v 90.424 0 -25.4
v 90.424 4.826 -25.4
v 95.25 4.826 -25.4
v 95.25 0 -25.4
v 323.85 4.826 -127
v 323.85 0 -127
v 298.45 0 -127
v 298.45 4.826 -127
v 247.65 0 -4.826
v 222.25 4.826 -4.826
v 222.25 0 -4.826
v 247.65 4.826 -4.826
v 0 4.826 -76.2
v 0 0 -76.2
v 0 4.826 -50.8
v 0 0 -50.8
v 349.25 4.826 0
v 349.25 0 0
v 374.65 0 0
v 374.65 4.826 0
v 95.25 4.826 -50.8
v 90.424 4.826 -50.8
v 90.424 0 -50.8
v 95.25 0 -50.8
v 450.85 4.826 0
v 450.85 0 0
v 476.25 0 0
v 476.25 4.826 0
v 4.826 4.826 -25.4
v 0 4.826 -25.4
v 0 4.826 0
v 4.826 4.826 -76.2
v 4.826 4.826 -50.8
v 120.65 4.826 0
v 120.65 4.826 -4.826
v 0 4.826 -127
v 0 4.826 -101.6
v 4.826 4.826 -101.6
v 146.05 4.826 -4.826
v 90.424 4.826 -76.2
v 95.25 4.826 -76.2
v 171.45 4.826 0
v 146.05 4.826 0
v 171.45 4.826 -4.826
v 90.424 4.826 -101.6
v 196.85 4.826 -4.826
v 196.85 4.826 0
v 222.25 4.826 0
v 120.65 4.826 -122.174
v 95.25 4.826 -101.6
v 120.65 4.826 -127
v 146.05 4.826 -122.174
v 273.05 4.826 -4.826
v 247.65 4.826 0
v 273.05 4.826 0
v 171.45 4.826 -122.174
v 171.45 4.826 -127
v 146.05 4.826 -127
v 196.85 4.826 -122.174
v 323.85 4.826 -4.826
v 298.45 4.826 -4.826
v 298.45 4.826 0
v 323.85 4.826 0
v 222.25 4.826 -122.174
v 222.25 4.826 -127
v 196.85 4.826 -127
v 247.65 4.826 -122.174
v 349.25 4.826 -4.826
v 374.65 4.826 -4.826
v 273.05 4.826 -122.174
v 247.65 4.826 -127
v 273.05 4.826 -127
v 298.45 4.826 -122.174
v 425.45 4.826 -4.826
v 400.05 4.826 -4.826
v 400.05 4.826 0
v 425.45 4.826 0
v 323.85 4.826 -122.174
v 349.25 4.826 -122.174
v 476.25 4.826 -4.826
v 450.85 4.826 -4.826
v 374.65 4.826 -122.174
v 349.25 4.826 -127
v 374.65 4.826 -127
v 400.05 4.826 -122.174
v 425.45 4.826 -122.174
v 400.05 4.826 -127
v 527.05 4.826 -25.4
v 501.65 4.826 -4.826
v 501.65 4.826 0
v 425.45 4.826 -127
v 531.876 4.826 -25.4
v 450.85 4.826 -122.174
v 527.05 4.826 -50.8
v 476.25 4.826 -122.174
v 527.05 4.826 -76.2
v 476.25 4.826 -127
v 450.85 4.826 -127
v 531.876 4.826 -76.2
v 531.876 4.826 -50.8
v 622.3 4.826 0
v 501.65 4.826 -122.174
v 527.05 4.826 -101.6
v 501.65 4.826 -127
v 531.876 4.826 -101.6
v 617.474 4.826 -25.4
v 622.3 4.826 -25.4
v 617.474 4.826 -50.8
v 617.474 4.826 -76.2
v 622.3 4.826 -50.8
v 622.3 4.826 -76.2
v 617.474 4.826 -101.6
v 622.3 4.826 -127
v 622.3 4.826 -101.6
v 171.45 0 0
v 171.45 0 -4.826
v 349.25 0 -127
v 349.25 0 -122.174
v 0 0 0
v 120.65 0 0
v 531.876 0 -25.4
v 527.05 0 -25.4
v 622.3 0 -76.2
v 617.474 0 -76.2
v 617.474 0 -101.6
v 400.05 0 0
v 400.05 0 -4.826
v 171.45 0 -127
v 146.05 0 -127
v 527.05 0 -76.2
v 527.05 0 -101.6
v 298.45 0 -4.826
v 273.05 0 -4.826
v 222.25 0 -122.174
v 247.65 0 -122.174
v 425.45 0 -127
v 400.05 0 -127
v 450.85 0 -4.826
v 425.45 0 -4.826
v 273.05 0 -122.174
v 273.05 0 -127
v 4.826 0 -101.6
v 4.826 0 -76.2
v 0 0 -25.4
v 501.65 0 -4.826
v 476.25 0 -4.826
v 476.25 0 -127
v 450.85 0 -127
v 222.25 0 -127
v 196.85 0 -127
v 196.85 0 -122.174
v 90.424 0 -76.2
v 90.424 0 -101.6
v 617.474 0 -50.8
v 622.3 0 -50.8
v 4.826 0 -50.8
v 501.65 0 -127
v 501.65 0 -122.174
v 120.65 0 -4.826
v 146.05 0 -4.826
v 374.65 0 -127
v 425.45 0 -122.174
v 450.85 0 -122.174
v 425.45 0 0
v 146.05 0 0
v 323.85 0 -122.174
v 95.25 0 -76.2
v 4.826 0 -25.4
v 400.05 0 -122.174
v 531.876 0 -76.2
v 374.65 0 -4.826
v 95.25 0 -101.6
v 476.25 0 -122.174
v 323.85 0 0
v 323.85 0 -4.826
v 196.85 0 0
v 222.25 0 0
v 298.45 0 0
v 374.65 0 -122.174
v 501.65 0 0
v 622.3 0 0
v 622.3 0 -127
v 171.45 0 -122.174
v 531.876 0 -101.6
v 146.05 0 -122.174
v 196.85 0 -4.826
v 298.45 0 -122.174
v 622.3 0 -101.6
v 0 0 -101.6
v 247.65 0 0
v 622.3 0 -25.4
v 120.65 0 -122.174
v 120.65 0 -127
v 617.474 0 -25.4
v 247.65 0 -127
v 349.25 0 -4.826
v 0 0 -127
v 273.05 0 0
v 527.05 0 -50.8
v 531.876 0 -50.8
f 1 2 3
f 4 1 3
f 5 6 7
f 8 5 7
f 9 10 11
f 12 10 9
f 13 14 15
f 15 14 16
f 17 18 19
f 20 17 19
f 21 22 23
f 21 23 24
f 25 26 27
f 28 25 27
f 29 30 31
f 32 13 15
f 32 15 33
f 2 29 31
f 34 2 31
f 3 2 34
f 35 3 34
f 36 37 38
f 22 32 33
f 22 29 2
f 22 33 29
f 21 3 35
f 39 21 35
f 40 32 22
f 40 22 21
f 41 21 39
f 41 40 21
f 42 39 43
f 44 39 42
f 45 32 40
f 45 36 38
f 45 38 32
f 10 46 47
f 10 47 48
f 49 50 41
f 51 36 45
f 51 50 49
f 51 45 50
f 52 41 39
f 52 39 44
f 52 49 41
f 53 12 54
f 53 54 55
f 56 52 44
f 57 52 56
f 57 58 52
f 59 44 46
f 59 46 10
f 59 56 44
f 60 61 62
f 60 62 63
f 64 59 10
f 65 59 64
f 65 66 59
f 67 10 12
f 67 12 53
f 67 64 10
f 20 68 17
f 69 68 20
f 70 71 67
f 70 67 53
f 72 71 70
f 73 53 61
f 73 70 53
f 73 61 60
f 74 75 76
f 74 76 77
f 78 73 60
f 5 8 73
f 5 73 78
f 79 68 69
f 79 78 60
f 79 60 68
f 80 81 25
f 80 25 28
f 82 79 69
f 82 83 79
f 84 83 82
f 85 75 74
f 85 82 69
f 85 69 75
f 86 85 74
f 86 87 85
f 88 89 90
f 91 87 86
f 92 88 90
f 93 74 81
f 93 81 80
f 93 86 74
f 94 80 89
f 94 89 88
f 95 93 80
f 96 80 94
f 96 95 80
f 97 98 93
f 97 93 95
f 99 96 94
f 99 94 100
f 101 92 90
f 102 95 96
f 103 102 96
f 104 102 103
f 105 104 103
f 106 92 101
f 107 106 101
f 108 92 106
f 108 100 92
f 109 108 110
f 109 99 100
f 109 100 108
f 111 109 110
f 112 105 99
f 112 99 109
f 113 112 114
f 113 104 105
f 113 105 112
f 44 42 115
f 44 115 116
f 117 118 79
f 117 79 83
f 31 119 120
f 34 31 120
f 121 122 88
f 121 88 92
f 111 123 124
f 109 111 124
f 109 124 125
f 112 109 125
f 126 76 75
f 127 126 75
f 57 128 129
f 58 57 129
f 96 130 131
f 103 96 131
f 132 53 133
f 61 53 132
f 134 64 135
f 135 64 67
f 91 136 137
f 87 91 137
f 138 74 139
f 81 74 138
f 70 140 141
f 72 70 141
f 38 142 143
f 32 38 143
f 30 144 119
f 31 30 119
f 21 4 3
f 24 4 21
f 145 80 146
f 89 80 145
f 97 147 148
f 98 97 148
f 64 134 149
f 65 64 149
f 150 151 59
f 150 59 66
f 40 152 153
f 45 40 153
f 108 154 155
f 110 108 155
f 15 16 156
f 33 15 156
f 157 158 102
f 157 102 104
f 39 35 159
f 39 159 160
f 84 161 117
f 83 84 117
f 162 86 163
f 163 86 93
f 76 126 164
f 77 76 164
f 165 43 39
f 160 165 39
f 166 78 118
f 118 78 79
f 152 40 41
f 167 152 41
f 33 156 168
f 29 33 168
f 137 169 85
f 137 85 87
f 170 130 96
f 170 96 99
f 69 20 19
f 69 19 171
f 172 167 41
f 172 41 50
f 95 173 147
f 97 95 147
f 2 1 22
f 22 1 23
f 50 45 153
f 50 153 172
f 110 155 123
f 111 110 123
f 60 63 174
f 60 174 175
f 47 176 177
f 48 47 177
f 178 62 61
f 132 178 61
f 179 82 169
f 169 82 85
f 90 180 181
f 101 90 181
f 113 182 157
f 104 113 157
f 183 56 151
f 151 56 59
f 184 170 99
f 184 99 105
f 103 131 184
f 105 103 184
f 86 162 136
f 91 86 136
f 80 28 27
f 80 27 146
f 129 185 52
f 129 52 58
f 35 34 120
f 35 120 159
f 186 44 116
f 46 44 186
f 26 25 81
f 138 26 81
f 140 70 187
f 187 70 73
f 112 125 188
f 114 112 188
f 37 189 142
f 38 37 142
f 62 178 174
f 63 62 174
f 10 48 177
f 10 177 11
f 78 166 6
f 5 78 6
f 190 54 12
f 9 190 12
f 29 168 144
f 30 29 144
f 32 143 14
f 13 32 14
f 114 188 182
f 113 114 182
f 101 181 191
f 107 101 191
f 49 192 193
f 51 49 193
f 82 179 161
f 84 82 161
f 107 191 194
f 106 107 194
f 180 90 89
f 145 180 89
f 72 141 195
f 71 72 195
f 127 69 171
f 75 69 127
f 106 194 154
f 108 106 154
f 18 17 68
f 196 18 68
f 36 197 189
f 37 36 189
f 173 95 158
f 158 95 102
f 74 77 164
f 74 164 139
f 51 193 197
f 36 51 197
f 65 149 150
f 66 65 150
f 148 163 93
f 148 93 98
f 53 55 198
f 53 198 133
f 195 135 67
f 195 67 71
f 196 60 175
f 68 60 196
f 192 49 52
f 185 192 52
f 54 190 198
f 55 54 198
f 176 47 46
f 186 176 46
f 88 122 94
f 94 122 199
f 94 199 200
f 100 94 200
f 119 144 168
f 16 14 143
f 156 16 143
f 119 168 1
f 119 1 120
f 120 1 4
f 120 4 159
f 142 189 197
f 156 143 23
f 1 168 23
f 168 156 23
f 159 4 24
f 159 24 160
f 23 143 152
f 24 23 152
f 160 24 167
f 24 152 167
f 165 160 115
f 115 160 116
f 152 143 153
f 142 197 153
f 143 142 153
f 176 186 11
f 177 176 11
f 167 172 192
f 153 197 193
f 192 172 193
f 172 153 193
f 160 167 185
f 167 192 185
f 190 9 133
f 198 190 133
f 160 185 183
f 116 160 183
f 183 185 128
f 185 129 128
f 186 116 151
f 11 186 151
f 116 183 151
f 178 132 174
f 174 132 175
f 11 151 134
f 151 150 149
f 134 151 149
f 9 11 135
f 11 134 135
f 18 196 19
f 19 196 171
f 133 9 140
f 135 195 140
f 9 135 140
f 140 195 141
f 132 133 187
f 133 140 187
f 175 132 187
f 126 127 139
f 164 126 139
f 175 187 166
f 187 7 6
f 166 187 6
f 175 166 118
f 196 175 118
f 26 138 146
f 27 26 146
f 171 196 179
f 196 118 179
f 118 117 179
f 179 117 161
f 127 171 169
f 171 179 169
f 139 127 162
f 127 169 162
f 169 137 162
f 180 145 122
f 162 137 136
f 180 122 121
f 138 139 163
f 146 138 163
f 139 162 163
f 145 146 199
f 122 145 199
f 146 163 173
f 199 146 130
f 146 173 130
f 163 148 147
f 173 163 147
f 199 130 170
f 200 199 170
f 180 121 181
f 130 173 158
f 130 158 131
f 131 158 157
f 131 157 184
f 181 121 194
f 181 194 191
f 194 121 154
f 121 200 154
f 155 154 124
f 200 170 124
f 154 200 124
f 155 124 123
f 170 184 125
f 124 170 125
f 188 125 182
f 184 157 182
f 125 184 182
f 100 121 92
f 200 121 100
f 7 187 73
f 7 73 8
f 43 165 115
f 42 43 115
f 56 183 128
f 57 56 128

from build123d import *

# Parameters (mm, degrees)
SKETCH1_W           = 4.826
SKETCH1_H           = 25.4
BOSS_EXTRUDE1_DEPTH = 4.826
SKETCH2_W           = 25.4
SKETCH2_H           = 4.826
CUT_EXTRUDE1_DEPTH  = 5.826


with BuildPart() as part:
    # Sketch1 → Boss-Extrude1 (new body)
    with BuildSketch(Plane(origin=(0, 0, 0), x_dir=(1, 0, 0), z_dir=(0, 1, 0))):
        Polygon((0, 25.4), (0, 0), (622.3, 0), (622.3, 25.4), (617.474, 25.4), (617.474, 50.8), (622.3, 50.8), (622.3, 76.2), (617.474, 76.2), (617.474, 101.6), (622.3, 101.6), (622.3, 127), (0, 127), (0, 101.6), (4.826, 101.6), (4.826, 76.2), (0, 76.2), (0, 50.8), (4.826, 50.8), (4.826, 25.4), align=None)
        with Locations((92.837, 38.1)):
            Rectangle(SKETCH1_W, SKETCH1_H, mode=Mode.SUBTRACT)
        with Locations((529.463, 38.1)):
            Rectangle(SKETCH1_W, SKETCH1_H, mode=Mode.SUBTRACT)
        with Locations((92.837, 88.9)):
            Rectangle(SKETCH1_W, SKETCH1_H, mode=Mode.SUBTRACT)
        with Locations((529.463, 88.9)):
            Rectangle(SKETCH1_W, SKETCH1_H, mode=Mode.SUBTRACT)
    extrude(amount=BOSS_EXTRUDE1_DEPTH)

    # Sketch2 → Cut-Extrude1 (cut, through all)
    with BuildSketch(Plane(origin=(0, 4.826, 0), x_dir=(1, 0, 0), z_dir=(0, 1, 0))):
        with Locations((133.35, 124.587)):
            Rectangle(SKETCH2_W, SKETCH2_H)
        with Locations((184.15, 124.587)):
            Rectangle(SKETCH2_W, SKETCH2_H)
        with Locations((234.95, 124.587)):
            Rectangle(SKETCH2_W, SKETCH2_H)
        with Locations((285.75, 124.587)):
            Rectangle(SKETCH2_W, SKETCH2_H)
        with Locations((336.55, 124.587)):
            Rectangle(SKETCH2_W, SKETCH2_H)
        with Locations((387.35, 124.587)):
            Rectangle(SKETCH2_W, SKETCH2_H)
        with Locations((438.15, 124.587)):
            Rectangle(SKETCH2_W, SKETCH2_H)
        with Locations((488.95, 124.587)):
            Rectangle(SKETCH2_W, SKETCH2_H)
        with Locations((488.95, 2.413)):
            Rectangle(SKETCH2_W, SKETCH2_H)
        with Locations((438.15, 2.413)):
            Rectangle(SKETCH2_W, SKETCH2_H)
        with Locations((387.35, 2.413)):
            Rectangle(SKETCH2_W, SKETCH2_H)
        with Locations((336.55, 2.413)):
            Rectangle(SKETCH2_W, SKETCH2_H)
        with Locations((133.35, 2.413)):
            Rectangle(SKETCH2_W, SKETCH2_H)
        with Locations((184.15, 2.413)):
            Rectangle(SKETCH2_W, SKETCH2_H)
        with Locations((234.95, 2.413)):
            Rectangle(SKETCH2_W, SKETCH2_H)
        with Locations((285.75, 2.413)):
            Rectangle(SKETCH2_W, SKETCH2_H)
    extrude(amount=-CUT_EXTRUDE1_DEPTH, mode=Mode.SUBTRACT)


solid = part.part
